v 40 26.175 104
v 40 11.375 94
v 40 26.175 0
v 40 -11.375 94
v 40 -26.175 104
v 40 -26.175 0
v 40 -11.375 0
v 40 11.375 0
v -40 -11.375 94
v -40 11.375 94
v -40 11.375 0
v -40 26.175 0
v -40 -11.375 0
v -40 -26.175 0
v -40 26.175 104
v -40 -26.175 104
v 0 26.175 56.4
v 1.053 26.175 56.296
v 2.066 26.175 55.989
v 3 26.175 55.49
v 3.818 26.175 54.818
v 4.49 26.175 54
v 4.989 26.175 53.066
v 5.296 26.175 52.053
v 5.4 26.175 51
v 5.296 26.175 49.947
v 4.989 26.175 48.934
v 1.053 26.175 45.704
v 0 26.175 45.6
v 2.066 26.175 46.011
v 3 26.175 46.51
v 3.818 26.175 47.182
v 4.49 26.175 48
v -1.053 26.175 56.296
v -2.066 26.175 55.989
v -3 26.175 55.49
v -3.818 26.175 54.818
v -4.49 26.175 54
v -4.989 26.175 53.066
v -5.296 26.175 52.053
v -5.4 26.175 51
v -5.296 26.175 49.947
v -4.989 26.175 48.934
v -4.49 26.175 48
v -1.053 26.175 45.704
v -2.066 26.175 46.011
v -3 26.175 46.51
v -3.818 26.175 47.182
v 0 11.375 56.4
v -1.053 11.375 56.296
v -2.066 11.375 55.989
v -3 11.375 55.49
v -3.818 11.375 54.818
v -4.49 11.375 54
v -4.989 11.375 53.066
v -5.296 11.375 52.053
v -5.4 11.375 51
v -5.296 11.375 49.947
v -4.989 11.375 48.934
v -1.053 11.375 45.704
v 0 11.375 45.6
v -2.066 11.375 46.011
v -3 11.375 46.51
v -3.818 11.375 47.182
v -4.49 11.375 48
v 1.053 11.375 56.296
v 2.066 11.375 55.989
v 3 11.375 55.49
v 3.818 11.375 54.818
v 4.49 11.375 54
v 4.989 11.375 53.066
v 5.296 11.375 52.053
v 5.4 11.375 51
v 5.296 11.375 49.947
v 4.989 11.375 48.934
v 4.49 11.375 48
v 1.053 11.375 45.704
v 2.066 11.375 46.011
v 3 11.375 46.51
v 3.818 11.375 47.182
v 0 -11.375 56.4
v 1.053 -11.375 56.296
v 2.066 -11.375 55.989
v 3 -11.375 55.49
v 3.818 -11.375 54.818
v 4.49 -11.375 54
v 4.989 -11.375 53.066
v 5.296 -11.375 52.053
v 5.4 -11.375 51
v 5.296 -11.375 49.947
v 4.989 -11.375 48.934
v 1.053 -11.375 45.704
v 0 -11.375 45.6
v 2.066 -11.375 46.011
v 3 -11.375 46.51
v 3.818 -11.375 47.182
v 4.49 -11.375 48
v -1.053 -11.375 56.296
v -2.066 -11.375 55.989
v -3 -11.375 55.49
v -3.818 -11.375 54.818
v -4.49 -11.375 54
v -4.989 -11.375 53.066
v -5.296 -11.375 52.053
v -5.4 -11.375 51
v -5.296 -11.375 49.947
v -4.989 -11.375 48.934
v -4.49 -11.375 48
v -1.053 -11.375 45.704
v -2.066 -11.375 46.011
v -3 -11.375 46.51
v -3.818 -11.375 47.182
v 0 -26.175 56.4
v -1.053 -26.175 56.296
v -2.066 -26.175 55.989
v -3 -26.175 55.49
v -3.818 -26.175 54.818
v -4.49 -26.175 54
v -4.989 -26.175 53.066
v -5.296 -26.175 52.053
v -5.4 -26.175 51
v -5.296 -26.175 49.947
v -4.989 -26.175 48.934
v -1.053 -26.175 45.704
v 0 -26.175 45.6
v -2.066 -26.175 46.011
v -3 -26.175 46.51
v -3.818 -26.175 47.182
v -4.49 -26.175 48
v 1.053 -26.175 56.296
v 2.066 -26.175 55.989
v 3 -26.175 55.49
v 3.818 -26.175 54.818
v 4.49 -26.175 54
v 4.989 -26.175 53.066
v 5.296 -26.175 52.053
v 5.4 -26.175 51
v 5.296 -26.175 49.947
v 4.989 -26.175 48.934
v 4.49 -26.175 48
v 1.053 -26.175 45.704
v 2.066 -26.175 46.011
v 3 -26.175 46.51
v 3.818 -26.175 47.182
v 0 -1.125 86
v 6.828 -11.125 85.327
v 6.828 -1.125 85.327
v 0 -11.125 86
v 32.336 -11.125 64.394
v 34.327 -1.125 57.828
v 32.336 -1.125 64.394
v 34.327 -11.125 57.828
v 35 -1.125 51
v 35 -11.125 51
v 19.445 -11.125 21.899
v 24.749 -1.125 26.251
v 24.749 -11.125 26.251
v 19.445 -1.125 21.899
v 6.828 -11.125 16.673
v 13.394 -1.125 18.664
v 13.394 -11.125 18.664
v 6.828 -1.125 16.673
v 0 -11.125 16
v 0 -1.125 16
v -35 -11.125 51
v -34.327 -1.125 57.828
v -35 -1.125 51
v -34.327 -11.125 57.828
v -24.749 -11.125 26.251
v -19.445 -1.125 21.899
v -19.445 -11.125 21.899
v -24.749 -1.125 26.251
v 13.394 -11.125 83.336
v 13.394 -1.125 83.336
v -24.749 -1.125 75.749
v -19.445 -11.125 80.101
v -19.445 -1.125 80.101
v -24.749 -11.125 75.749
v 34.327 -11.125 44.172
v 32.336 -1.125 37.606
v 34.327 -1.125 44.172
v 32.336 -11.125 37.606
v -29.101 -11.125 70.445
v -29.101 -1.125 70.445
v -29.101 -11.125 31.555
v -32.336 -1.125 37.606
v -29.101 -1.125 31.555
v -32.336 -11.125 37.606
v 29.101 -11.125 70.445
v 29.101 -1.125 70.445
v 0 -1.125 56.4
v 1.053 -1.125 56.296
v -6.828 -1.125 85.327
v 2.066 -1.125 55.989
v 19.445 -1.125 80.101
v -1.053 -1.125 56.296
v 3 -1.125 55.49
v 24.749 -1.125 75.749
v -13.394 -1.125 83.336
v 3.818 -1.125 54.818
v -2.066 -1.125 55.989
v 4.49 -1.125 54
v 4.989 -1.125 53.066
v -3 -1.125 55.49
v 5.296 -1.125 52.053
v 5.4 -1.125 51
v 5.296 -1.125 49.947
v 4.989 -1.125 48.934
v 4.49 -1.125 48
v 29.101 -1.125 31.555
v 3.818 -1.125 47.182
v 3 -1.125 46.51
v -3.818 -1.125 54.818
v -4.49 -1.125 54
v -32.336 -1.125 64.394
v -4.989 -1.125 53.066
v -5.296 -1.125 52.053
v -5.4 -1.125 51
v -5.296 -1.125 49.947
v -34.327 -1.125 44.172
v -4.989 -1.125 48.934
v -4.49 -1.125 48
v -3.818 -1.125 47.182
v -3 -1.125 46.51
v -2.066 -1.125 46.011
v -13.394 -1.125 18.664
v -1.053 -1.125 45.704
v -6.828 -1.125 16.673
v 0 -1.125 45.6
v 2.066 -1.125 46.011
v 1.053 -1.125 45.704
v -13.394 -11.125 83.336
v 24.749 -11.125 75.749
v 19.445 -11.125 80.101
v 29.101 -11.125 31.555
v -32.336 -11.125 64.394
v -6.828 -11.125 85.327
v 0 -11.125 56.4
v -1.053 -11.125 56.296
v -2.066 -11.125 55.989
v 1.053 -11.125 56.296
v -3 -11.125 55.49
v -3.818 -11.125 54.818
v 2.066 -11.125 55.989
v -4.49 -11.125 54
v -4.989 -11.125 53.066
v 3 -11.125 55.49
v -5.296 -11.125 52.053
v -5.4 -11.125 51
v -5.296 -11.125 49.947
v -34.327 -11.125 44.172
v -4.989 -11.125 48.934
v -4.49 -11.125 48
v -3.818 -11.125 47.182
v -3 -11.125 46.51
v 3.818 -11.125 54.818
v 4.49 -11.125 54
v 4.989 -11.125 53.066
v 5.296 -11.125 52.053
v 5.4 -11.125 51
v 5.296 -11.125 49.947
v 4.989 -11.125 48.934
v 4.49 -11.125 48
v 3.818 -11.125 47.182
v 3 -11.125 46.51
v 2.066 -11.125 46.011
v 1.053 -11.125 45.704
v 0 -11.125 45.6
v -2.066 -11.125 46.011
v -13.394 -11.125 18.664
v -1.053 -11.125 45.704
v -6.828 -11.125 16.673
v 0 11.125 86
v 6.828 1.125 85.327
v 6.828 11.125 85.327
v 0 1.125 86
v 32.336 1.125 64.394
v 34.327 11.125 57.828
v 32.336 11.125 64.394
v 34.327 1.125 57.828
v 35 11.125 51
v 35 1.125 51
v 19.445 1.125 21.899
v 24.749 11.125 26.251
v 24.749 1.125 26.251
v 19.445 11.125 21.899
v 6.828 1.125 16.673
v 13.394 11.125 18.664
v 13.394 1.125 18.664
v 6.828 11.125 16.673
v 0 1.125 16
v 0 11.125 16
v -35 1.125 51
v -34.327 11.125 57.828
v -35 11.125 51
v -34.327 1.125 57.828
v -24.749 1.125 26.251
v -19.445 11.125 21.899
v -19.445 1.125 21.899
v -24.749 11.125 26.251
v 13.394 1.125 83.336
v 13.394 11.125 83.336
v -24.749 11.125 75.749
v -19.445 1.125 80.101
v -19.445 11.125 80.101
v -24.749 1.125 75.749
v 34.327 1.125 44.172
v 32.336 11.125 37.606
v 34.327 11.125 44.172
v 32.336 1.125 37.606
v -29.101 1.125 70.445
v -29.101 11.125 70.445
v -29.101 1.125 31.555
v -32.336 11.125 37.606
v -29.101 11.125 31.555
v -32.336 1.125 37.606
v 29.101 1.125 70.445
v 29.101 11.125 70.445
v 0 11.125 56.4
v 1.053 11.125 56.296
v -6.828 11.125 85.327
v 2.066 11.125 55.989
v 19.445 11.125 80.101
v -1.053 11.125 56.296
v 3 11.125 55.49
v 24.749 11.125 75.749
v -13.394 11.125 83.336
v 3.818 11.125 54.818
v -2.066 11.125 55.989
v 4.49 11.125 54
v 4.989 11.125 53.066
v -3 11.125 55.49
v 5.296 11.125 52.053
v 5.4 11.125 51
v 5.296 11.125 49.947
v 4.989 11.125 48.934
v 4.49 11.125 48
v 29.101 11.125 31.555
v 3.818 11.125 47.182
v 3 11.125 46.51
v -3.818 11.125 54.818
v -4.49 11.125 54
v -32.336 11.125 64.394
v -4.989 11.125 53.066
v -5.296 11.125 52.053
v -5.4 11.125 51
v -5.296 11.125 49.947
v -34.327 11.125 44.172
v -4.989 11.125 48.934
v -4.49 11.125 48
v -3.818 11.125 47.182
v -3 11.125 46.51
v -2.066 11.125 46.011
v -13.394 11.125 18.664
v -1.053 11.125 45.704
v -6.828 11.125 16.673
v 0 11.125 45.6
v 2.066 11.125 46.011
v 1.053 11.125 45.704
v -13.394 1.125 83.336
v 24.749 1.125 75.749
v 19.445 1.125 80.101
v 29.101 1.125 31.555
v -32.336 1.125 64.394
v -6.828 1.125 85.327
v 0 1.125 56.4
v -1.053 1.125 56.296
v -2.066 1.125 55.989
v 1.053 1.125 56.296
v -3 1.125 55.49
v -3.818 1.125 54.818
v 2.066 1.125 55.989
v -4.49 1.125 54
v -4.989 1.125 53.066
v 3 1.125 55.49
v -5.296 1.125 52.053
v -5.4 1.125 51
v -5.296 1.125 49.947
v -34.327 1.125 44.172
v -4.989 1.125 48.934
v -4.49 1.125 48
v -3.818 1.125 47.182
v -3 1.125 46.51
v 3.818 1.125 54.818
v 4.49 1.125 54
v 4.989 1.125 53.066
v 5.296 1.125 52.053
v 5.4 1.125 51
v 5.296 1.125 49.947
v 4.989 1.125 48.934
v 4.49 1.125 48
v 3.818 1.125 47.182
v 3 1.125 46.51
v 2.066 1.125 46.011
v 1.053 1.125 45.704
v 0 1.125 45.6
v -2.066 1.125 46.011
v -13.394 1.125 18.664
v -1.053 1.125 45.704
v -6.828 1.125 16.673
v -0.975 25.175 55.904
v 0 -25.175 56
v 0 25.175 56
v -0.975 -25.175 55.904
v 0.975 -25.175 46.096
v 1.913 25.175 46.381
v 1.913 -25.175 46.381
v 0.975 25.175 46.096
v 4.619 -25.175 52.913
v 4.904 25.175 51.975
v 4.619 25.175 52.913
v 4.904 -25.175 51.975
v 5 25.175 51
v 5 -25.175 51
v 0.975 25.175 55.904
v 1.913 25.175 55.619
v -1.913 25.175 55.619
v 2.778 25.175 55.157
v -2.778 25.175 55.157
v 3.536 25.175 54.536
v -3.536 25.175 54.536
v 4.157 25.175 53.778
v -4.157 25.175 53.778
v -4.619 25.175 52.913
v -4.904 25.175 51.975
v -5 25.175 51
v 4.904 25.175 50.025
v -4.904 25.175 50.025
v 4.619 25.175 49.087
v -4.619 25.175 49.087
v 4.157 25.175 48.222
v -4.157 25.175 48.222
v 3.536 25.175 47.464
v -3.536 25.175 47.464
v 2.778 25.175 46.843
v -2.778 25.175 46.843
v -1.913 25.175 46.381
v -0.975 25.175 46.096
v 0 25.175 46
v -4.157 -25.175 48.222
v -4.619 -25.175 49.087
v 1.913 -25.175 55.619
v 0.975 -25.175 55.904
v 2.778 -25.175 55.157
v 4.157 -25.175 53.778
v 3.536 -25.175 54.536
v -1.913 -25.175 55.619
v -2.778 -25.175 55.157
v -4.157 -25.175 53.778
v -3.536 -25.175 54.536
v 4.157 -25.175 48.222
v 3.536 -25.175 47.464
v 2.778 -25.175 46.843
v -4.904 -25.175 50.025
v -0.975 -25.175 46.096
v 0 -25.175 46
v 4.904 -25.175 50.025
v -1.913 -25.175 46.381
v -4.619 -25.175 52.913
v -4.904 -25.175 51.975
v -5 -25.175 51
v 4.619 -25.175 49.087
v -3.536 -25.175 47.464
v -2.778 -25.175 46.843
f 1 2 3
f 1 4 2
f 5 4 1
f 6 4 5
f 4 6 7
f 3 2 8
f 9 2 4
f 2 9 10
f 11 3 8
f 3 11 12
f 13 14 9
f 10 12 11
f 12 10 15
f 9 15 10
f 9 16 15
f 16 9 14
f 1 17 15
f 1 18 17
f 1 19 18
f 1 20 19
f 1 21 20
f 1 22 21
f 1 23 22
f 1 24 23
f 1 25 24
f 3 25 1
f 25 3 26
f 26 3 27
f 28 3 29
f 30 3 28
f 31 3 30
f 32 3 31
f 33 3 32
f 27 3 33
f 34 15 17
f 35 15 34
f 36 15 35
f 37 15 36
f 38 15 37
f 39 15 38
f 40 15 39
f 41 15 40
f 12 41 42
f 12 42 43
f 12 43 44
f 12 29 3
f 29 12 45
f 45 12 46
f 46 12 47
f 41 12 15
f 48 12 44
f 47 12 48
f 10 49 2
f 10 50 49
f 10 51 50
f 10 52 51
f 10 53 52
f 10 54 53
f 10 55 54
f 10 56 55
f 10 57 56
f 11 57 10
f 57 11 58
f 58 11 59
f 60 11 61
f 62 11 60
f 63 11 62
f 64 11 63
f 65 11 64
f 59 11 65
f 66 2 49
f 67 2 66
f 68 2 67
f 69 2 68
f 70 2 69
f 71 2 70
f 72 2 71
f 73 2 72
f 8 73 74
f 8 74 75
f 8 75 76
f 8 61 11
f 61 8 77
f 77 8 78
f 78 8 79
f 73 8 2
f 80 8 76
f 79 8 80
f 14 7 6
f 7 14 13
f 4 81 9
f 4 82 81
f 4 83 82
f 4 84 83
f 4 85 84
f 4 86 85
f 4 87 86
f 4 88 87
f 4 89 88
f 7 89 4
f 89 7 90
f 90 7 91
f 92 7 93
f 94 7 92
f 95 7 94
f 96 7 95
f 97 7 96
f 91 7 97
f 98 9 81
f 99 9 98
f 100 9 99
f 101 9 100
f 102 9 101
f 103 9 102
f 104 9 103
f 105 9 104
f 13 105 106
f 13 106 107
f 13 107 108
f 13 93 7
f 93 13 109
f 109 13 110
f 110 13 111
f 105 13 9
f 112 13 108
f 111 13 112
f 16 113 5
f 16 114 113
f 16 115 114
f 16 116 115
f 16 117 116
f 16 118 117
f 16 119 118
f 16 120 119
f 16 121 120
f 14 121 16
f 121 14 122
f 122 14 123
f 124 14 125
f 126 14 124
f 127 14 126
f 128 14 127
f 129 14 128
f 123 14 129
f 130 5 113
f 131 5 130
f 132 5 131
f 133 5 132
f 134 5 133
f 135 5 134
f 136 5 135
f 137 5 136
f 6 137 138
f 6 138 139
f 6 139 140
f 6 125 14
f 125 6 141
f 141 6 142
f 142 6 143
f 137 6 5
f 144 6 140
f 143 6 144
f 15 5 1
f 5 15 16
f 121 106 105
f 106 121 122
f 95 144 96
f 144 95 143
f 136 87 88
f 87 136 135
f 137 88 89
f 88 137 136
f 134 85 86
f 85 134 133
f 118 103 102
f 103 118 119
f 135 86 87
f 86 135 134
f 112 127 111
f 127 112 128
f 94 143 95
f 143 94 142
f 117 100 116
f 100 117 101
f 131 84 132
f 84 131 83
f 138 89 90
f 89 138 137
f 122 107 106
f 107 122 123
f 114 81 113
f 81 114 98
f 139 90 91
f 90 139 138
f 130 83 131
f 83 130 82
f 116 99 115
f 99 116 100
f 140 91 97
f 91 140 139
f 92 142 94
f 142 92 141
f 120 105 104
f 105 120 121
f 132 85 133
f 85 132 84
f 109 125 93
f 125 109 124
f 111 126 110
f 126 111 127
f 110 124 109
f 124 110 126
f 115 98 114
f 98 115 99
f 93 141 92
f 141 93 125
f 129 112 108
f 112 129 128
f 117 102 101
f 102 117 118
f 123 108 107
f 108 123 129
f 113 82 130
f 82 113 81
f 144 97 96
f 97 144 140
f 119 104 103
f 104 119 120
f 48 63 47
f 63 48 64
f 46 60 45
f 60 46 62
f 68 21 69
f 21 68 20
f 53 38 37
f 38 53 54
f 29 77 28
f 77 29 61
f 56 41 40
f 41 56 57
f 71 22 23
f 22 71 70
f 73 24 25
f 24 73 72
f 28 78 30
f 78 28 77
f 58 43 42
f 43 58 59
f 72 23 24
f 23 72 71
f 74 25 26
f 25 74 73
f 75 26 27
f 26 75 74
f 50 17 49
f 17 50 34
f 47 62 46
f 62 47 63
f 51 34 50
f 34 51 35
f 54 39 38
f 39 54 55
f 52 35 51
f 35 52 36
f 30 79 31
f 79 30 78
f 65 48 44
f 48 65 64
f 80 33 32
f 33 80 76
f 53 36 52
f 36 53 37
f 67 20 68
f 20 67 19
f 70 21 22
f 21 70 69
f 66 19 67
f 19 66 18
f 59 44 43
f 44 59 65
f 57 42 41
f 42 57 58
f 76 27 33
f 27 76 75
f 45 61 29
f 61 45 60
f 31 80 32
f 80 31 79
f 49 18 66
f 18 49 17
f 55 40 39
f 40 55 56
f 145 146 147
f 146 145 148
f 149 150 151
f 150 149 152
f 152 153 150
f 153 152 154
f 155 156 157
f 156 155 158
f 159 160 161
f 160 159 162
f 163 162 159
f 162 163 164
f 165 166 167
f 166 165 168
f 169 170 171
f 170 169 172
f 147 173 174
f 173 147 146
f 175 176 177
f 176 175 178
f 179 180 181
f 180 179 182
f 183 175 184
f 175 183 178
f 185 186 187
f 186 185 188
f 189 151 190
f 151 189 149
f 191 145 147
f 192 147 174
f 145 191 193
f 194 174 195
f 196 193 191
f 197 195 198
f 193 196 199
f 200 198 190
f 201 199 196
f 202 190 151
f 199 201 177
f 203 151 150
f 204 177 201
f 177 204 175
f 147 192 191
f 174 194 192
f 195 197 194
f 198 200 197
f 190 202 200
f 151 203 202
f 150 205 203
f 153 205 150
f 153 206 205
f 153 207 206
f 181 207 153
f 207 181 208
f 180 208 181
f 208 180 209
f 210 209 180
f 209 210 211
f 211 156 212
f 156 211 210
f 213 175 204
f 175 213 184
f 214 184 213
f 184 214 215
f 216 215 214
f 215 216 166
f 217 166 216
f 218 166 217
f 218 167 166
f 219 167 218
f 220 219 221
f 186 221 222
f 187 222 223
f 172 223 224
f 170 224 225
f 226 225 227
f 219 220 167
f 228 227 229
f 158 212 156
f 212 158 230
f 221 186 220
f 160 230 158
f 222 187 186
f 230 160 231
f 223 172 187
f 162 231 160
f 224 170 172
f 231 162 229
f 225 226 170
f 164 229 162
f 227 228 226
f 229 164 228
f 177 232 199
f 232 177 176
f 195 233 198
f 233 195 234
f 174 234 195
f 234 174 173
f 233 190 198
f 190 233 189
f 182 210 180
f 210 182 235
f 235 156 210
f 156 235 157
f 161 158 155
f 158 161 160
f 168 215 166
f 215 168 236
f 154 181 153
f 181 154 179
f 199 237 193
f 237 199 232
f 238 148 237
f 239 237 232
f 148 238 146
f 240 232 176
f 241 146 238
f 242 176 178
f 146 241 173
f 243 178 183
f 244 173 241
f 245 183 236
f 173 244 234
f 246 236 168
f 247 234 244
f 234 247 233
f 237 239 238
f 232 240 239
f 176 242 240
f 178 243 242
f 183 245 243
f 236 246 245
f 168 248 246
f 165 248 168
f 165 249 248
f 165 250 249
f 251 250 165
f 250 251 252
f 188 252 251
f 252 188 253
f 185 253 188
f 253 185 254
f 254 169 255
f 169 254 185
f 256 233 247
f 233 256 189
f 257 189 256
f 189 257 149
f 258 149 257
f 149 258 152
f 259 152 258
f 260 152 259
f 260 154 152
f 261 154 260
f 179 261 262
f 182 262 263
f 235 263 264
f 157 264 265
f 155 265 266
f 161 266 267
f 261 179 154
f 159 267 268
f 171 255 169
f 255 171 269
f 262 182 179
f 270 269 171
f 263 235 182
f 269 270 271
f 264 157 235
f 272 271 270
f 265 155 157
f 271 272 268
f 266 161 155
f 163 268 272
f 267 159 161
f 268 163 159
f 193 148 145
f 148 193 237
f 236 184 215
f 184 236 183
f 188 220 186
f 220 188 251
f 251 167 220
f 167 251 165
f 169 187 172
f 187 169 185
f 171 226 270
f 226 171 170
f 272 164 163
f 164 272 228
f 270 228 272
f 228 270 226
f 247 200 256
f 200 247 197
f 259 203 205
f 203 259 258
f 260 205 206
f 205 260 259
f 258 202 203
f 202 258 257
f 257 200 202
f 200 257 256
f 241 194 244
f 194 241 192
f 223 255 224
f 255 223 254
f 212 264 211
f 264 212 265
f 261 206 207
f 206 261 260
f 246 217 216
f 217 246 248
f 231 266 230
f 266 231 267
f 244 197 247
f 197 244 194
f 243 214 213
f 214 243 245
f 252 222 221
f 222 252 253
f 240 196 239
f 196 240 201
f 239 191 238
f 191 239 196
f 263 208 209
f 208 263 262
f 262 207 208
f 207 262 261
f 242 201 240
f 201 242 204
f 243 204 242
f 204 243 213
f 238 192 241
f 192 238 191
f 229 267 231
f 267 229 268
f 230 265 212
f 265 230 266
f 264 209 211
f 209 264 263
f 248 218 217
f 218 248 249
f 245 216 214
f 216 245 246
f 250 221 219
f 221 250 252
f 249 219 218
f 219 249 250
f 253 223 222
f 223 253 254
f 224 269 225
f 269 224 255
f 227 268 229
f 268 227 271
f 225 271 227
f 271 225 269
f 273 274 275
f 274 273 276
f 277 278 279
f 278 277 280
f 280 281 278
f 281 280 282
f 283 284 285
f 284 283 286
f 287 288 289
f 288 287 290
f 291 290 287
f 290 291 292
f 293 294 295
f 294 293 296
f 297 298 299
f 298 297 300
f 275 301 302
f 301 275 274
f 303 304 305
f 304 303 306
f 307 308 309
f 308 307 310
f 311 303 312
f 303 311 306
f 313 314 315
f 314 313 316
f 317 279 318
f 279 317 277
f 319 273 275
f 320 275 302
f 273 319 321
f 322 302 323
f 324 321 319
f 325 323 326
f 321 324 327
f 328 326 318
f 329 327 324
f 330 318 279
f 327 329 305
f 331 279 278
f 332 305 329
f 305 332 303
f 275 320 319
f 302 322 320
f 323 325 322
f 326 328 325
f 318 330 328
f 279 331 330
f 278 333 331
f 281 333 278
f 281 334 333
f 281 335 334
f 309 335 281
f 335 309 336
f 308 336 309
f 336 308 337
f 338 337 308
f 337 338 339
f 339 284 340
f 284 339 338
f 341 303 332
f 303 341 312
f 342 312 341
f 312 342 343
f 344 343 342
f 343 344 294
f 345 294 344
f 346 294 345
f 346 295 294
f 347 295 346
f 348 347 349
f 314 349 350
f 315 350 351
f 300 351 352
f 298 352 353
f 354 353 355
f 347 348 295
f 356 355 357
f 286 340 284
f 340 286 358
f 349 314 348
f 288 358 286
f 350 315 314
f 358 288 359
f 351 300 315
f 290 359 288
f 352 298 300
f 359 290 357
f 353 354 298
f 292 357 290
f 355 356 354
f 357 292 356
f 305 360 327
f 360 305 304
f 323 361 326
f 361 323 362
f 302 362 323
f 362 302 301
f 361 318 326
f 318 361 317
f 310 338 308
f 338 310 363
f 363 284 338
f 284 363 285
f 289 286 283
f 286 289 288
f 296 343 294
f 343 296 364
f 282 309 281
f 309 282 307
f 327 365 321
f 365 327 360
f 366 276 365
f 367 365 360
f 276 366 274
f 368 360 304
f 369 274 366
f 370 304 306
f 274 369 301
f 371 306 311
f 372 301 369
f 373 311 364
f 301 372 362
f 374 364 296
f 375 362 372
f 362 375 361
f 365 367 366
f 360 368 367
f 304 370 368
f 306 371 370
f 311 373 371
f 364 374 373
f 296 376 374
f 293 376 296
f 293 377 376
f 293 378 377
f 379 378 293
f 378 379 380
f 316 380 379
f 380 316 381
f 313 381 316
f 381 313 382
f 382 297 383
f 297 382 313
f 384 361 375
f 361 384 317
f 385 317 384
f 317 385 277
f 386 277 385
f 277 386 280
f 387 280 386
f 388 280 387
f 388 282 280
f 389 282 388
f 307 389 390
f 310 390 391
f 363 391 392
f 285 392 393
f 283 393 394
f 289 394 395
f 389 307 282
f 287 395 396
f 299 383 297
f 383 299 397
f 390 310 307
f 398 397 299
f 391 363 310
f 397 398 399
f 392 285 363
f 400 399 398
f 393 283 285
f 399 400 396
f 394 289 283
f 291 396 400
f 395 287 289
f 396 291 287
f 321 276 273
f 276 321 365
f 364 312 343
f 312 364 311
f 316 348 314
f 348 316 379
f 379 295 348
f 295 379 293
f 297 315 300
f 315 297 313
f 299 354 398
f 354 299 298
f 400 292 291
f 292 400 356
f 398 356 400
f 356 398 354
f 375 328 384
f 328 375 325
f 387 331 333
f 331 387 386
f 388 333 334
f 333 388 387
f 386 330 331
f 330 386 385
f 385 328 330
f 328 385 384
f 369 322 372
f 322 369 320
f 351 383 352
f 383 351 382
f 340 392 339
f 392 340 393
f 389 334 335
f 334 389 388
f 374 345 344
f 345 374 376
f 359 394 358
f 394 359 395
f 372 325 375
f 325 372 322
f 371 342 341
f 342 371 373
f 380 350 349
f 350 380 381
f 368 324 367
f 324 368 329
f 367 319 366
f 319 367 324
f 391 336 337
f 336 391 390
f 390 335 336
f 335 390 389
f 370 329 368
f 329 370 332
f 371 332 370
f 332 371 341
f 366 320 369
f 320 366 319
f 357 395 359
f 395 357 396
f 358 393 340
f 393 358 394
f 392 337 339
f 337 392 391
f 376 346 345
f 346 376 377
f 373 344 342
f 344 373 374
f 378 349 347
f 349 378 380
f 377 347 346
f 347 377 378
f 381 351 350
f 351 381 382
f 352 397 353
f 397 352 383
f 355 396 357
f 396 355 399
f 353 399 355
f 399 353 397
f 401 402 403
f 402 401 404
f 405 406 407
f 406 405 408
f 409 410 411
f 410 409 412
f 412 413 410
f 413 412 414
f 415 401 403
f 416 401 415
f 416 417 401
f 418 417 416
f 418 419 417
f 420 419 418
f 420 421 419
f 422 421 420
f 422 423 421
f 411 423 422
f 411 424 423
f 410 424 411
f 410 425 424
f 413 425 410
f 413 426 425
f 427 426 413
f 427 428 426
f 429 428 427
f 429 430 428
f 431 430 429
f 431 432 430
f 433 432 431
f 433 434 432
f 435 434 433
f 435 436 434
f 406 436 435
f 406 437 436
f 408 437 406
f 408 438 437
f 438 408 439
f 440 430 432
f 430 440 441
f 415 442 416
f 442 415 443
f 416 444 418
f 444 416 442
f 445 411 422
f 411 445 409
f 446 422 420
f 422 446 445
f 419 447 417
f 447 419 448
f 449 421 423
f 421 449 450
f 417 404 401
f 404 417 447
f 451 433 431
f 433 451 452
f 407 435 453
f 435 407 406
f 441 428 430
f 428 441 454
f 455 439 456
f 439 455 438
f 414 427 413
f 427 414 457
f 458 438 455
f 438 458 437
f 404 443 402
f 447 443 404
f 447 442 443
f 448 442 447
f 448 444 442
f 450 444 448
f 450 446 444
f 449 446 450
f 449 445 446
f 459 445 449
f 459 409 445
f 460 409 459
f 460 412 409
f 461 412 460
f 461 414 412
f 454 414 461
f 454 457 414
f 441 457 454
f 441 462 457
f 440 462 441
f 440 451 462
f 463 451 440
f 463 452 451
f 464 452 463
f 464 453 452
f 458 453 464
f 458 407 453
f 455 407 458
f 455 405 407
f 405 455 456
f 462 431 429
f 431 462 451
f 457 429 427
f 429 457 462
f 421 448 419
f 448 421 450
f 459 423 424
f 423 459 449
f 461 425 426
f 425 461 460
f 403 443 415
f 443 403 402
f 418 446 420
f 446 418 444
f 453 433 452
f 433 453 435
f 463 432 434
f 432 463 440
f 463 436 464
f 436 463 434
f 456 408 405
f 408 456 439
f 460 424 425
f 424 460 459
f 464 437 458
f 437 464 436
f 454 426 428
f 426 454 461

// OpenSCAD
$fn = 32;

// ------------------------------------------------------------------------
// Trolley wheel set: wheels d70, fork 94 mm tall
// Every part is its own module, assembly() places every instance.
// ------------------------------------------------------------------------

// --- part 1 ---
module trolley_fork() {
  difference() {
    union() {
      translate([-40, 11.375, 0]) cube([80, 14.8, 94]);
      translate([-40, -26.175, 0]) cube([80, 14.8, 94]);
      translate([-40, -26.175, 94]) cube([80, 52.35, 10]);
    }
    translate([0, -18.775, 51]) rotate([90, 0, 0]) cylinder(h = 16.8, d = 10.8, center = true);
    translate([0, 18.775, 51]) rotate([90, 0, 0]) cylinder(h = 16.8, d = 10.8, center = true);
  }
}

// --- part 2 ---
module trolley_wheel() {
  difference() {
      translate([0, 0, 0]) cylinder(h = 10, d = 70);
      translate([0, 0, -1]) cylinder(h = 12, d = 10.8);
    }
}

// --- part 3 ---
module trolley_axle() {
  translate([0, 0, -25.175]) cylinder(h = 50.35, d = 10);
}

// --- assembly ---
module assembly() {
  color([0.80, 0.24, 0.20]) translate([0, 0, 0]) rotate([0, 0, 0]) trolley_fork();
  color([0.20, 0.45, 0.75]) translate([0, -1.125, 51]) rotate([90, 0, 0]) trolley_wheel();
  color([0.25, 0.62, 0.32]) translate([0, 11.125, 51]) rotate([90, 0, 0]) trolley_wheel();
  color([0.92, 0.70, 0.18]) translate([0, 0, 51]) rotate([90, 0, 0]) trolley_axle();
}

assembly();
